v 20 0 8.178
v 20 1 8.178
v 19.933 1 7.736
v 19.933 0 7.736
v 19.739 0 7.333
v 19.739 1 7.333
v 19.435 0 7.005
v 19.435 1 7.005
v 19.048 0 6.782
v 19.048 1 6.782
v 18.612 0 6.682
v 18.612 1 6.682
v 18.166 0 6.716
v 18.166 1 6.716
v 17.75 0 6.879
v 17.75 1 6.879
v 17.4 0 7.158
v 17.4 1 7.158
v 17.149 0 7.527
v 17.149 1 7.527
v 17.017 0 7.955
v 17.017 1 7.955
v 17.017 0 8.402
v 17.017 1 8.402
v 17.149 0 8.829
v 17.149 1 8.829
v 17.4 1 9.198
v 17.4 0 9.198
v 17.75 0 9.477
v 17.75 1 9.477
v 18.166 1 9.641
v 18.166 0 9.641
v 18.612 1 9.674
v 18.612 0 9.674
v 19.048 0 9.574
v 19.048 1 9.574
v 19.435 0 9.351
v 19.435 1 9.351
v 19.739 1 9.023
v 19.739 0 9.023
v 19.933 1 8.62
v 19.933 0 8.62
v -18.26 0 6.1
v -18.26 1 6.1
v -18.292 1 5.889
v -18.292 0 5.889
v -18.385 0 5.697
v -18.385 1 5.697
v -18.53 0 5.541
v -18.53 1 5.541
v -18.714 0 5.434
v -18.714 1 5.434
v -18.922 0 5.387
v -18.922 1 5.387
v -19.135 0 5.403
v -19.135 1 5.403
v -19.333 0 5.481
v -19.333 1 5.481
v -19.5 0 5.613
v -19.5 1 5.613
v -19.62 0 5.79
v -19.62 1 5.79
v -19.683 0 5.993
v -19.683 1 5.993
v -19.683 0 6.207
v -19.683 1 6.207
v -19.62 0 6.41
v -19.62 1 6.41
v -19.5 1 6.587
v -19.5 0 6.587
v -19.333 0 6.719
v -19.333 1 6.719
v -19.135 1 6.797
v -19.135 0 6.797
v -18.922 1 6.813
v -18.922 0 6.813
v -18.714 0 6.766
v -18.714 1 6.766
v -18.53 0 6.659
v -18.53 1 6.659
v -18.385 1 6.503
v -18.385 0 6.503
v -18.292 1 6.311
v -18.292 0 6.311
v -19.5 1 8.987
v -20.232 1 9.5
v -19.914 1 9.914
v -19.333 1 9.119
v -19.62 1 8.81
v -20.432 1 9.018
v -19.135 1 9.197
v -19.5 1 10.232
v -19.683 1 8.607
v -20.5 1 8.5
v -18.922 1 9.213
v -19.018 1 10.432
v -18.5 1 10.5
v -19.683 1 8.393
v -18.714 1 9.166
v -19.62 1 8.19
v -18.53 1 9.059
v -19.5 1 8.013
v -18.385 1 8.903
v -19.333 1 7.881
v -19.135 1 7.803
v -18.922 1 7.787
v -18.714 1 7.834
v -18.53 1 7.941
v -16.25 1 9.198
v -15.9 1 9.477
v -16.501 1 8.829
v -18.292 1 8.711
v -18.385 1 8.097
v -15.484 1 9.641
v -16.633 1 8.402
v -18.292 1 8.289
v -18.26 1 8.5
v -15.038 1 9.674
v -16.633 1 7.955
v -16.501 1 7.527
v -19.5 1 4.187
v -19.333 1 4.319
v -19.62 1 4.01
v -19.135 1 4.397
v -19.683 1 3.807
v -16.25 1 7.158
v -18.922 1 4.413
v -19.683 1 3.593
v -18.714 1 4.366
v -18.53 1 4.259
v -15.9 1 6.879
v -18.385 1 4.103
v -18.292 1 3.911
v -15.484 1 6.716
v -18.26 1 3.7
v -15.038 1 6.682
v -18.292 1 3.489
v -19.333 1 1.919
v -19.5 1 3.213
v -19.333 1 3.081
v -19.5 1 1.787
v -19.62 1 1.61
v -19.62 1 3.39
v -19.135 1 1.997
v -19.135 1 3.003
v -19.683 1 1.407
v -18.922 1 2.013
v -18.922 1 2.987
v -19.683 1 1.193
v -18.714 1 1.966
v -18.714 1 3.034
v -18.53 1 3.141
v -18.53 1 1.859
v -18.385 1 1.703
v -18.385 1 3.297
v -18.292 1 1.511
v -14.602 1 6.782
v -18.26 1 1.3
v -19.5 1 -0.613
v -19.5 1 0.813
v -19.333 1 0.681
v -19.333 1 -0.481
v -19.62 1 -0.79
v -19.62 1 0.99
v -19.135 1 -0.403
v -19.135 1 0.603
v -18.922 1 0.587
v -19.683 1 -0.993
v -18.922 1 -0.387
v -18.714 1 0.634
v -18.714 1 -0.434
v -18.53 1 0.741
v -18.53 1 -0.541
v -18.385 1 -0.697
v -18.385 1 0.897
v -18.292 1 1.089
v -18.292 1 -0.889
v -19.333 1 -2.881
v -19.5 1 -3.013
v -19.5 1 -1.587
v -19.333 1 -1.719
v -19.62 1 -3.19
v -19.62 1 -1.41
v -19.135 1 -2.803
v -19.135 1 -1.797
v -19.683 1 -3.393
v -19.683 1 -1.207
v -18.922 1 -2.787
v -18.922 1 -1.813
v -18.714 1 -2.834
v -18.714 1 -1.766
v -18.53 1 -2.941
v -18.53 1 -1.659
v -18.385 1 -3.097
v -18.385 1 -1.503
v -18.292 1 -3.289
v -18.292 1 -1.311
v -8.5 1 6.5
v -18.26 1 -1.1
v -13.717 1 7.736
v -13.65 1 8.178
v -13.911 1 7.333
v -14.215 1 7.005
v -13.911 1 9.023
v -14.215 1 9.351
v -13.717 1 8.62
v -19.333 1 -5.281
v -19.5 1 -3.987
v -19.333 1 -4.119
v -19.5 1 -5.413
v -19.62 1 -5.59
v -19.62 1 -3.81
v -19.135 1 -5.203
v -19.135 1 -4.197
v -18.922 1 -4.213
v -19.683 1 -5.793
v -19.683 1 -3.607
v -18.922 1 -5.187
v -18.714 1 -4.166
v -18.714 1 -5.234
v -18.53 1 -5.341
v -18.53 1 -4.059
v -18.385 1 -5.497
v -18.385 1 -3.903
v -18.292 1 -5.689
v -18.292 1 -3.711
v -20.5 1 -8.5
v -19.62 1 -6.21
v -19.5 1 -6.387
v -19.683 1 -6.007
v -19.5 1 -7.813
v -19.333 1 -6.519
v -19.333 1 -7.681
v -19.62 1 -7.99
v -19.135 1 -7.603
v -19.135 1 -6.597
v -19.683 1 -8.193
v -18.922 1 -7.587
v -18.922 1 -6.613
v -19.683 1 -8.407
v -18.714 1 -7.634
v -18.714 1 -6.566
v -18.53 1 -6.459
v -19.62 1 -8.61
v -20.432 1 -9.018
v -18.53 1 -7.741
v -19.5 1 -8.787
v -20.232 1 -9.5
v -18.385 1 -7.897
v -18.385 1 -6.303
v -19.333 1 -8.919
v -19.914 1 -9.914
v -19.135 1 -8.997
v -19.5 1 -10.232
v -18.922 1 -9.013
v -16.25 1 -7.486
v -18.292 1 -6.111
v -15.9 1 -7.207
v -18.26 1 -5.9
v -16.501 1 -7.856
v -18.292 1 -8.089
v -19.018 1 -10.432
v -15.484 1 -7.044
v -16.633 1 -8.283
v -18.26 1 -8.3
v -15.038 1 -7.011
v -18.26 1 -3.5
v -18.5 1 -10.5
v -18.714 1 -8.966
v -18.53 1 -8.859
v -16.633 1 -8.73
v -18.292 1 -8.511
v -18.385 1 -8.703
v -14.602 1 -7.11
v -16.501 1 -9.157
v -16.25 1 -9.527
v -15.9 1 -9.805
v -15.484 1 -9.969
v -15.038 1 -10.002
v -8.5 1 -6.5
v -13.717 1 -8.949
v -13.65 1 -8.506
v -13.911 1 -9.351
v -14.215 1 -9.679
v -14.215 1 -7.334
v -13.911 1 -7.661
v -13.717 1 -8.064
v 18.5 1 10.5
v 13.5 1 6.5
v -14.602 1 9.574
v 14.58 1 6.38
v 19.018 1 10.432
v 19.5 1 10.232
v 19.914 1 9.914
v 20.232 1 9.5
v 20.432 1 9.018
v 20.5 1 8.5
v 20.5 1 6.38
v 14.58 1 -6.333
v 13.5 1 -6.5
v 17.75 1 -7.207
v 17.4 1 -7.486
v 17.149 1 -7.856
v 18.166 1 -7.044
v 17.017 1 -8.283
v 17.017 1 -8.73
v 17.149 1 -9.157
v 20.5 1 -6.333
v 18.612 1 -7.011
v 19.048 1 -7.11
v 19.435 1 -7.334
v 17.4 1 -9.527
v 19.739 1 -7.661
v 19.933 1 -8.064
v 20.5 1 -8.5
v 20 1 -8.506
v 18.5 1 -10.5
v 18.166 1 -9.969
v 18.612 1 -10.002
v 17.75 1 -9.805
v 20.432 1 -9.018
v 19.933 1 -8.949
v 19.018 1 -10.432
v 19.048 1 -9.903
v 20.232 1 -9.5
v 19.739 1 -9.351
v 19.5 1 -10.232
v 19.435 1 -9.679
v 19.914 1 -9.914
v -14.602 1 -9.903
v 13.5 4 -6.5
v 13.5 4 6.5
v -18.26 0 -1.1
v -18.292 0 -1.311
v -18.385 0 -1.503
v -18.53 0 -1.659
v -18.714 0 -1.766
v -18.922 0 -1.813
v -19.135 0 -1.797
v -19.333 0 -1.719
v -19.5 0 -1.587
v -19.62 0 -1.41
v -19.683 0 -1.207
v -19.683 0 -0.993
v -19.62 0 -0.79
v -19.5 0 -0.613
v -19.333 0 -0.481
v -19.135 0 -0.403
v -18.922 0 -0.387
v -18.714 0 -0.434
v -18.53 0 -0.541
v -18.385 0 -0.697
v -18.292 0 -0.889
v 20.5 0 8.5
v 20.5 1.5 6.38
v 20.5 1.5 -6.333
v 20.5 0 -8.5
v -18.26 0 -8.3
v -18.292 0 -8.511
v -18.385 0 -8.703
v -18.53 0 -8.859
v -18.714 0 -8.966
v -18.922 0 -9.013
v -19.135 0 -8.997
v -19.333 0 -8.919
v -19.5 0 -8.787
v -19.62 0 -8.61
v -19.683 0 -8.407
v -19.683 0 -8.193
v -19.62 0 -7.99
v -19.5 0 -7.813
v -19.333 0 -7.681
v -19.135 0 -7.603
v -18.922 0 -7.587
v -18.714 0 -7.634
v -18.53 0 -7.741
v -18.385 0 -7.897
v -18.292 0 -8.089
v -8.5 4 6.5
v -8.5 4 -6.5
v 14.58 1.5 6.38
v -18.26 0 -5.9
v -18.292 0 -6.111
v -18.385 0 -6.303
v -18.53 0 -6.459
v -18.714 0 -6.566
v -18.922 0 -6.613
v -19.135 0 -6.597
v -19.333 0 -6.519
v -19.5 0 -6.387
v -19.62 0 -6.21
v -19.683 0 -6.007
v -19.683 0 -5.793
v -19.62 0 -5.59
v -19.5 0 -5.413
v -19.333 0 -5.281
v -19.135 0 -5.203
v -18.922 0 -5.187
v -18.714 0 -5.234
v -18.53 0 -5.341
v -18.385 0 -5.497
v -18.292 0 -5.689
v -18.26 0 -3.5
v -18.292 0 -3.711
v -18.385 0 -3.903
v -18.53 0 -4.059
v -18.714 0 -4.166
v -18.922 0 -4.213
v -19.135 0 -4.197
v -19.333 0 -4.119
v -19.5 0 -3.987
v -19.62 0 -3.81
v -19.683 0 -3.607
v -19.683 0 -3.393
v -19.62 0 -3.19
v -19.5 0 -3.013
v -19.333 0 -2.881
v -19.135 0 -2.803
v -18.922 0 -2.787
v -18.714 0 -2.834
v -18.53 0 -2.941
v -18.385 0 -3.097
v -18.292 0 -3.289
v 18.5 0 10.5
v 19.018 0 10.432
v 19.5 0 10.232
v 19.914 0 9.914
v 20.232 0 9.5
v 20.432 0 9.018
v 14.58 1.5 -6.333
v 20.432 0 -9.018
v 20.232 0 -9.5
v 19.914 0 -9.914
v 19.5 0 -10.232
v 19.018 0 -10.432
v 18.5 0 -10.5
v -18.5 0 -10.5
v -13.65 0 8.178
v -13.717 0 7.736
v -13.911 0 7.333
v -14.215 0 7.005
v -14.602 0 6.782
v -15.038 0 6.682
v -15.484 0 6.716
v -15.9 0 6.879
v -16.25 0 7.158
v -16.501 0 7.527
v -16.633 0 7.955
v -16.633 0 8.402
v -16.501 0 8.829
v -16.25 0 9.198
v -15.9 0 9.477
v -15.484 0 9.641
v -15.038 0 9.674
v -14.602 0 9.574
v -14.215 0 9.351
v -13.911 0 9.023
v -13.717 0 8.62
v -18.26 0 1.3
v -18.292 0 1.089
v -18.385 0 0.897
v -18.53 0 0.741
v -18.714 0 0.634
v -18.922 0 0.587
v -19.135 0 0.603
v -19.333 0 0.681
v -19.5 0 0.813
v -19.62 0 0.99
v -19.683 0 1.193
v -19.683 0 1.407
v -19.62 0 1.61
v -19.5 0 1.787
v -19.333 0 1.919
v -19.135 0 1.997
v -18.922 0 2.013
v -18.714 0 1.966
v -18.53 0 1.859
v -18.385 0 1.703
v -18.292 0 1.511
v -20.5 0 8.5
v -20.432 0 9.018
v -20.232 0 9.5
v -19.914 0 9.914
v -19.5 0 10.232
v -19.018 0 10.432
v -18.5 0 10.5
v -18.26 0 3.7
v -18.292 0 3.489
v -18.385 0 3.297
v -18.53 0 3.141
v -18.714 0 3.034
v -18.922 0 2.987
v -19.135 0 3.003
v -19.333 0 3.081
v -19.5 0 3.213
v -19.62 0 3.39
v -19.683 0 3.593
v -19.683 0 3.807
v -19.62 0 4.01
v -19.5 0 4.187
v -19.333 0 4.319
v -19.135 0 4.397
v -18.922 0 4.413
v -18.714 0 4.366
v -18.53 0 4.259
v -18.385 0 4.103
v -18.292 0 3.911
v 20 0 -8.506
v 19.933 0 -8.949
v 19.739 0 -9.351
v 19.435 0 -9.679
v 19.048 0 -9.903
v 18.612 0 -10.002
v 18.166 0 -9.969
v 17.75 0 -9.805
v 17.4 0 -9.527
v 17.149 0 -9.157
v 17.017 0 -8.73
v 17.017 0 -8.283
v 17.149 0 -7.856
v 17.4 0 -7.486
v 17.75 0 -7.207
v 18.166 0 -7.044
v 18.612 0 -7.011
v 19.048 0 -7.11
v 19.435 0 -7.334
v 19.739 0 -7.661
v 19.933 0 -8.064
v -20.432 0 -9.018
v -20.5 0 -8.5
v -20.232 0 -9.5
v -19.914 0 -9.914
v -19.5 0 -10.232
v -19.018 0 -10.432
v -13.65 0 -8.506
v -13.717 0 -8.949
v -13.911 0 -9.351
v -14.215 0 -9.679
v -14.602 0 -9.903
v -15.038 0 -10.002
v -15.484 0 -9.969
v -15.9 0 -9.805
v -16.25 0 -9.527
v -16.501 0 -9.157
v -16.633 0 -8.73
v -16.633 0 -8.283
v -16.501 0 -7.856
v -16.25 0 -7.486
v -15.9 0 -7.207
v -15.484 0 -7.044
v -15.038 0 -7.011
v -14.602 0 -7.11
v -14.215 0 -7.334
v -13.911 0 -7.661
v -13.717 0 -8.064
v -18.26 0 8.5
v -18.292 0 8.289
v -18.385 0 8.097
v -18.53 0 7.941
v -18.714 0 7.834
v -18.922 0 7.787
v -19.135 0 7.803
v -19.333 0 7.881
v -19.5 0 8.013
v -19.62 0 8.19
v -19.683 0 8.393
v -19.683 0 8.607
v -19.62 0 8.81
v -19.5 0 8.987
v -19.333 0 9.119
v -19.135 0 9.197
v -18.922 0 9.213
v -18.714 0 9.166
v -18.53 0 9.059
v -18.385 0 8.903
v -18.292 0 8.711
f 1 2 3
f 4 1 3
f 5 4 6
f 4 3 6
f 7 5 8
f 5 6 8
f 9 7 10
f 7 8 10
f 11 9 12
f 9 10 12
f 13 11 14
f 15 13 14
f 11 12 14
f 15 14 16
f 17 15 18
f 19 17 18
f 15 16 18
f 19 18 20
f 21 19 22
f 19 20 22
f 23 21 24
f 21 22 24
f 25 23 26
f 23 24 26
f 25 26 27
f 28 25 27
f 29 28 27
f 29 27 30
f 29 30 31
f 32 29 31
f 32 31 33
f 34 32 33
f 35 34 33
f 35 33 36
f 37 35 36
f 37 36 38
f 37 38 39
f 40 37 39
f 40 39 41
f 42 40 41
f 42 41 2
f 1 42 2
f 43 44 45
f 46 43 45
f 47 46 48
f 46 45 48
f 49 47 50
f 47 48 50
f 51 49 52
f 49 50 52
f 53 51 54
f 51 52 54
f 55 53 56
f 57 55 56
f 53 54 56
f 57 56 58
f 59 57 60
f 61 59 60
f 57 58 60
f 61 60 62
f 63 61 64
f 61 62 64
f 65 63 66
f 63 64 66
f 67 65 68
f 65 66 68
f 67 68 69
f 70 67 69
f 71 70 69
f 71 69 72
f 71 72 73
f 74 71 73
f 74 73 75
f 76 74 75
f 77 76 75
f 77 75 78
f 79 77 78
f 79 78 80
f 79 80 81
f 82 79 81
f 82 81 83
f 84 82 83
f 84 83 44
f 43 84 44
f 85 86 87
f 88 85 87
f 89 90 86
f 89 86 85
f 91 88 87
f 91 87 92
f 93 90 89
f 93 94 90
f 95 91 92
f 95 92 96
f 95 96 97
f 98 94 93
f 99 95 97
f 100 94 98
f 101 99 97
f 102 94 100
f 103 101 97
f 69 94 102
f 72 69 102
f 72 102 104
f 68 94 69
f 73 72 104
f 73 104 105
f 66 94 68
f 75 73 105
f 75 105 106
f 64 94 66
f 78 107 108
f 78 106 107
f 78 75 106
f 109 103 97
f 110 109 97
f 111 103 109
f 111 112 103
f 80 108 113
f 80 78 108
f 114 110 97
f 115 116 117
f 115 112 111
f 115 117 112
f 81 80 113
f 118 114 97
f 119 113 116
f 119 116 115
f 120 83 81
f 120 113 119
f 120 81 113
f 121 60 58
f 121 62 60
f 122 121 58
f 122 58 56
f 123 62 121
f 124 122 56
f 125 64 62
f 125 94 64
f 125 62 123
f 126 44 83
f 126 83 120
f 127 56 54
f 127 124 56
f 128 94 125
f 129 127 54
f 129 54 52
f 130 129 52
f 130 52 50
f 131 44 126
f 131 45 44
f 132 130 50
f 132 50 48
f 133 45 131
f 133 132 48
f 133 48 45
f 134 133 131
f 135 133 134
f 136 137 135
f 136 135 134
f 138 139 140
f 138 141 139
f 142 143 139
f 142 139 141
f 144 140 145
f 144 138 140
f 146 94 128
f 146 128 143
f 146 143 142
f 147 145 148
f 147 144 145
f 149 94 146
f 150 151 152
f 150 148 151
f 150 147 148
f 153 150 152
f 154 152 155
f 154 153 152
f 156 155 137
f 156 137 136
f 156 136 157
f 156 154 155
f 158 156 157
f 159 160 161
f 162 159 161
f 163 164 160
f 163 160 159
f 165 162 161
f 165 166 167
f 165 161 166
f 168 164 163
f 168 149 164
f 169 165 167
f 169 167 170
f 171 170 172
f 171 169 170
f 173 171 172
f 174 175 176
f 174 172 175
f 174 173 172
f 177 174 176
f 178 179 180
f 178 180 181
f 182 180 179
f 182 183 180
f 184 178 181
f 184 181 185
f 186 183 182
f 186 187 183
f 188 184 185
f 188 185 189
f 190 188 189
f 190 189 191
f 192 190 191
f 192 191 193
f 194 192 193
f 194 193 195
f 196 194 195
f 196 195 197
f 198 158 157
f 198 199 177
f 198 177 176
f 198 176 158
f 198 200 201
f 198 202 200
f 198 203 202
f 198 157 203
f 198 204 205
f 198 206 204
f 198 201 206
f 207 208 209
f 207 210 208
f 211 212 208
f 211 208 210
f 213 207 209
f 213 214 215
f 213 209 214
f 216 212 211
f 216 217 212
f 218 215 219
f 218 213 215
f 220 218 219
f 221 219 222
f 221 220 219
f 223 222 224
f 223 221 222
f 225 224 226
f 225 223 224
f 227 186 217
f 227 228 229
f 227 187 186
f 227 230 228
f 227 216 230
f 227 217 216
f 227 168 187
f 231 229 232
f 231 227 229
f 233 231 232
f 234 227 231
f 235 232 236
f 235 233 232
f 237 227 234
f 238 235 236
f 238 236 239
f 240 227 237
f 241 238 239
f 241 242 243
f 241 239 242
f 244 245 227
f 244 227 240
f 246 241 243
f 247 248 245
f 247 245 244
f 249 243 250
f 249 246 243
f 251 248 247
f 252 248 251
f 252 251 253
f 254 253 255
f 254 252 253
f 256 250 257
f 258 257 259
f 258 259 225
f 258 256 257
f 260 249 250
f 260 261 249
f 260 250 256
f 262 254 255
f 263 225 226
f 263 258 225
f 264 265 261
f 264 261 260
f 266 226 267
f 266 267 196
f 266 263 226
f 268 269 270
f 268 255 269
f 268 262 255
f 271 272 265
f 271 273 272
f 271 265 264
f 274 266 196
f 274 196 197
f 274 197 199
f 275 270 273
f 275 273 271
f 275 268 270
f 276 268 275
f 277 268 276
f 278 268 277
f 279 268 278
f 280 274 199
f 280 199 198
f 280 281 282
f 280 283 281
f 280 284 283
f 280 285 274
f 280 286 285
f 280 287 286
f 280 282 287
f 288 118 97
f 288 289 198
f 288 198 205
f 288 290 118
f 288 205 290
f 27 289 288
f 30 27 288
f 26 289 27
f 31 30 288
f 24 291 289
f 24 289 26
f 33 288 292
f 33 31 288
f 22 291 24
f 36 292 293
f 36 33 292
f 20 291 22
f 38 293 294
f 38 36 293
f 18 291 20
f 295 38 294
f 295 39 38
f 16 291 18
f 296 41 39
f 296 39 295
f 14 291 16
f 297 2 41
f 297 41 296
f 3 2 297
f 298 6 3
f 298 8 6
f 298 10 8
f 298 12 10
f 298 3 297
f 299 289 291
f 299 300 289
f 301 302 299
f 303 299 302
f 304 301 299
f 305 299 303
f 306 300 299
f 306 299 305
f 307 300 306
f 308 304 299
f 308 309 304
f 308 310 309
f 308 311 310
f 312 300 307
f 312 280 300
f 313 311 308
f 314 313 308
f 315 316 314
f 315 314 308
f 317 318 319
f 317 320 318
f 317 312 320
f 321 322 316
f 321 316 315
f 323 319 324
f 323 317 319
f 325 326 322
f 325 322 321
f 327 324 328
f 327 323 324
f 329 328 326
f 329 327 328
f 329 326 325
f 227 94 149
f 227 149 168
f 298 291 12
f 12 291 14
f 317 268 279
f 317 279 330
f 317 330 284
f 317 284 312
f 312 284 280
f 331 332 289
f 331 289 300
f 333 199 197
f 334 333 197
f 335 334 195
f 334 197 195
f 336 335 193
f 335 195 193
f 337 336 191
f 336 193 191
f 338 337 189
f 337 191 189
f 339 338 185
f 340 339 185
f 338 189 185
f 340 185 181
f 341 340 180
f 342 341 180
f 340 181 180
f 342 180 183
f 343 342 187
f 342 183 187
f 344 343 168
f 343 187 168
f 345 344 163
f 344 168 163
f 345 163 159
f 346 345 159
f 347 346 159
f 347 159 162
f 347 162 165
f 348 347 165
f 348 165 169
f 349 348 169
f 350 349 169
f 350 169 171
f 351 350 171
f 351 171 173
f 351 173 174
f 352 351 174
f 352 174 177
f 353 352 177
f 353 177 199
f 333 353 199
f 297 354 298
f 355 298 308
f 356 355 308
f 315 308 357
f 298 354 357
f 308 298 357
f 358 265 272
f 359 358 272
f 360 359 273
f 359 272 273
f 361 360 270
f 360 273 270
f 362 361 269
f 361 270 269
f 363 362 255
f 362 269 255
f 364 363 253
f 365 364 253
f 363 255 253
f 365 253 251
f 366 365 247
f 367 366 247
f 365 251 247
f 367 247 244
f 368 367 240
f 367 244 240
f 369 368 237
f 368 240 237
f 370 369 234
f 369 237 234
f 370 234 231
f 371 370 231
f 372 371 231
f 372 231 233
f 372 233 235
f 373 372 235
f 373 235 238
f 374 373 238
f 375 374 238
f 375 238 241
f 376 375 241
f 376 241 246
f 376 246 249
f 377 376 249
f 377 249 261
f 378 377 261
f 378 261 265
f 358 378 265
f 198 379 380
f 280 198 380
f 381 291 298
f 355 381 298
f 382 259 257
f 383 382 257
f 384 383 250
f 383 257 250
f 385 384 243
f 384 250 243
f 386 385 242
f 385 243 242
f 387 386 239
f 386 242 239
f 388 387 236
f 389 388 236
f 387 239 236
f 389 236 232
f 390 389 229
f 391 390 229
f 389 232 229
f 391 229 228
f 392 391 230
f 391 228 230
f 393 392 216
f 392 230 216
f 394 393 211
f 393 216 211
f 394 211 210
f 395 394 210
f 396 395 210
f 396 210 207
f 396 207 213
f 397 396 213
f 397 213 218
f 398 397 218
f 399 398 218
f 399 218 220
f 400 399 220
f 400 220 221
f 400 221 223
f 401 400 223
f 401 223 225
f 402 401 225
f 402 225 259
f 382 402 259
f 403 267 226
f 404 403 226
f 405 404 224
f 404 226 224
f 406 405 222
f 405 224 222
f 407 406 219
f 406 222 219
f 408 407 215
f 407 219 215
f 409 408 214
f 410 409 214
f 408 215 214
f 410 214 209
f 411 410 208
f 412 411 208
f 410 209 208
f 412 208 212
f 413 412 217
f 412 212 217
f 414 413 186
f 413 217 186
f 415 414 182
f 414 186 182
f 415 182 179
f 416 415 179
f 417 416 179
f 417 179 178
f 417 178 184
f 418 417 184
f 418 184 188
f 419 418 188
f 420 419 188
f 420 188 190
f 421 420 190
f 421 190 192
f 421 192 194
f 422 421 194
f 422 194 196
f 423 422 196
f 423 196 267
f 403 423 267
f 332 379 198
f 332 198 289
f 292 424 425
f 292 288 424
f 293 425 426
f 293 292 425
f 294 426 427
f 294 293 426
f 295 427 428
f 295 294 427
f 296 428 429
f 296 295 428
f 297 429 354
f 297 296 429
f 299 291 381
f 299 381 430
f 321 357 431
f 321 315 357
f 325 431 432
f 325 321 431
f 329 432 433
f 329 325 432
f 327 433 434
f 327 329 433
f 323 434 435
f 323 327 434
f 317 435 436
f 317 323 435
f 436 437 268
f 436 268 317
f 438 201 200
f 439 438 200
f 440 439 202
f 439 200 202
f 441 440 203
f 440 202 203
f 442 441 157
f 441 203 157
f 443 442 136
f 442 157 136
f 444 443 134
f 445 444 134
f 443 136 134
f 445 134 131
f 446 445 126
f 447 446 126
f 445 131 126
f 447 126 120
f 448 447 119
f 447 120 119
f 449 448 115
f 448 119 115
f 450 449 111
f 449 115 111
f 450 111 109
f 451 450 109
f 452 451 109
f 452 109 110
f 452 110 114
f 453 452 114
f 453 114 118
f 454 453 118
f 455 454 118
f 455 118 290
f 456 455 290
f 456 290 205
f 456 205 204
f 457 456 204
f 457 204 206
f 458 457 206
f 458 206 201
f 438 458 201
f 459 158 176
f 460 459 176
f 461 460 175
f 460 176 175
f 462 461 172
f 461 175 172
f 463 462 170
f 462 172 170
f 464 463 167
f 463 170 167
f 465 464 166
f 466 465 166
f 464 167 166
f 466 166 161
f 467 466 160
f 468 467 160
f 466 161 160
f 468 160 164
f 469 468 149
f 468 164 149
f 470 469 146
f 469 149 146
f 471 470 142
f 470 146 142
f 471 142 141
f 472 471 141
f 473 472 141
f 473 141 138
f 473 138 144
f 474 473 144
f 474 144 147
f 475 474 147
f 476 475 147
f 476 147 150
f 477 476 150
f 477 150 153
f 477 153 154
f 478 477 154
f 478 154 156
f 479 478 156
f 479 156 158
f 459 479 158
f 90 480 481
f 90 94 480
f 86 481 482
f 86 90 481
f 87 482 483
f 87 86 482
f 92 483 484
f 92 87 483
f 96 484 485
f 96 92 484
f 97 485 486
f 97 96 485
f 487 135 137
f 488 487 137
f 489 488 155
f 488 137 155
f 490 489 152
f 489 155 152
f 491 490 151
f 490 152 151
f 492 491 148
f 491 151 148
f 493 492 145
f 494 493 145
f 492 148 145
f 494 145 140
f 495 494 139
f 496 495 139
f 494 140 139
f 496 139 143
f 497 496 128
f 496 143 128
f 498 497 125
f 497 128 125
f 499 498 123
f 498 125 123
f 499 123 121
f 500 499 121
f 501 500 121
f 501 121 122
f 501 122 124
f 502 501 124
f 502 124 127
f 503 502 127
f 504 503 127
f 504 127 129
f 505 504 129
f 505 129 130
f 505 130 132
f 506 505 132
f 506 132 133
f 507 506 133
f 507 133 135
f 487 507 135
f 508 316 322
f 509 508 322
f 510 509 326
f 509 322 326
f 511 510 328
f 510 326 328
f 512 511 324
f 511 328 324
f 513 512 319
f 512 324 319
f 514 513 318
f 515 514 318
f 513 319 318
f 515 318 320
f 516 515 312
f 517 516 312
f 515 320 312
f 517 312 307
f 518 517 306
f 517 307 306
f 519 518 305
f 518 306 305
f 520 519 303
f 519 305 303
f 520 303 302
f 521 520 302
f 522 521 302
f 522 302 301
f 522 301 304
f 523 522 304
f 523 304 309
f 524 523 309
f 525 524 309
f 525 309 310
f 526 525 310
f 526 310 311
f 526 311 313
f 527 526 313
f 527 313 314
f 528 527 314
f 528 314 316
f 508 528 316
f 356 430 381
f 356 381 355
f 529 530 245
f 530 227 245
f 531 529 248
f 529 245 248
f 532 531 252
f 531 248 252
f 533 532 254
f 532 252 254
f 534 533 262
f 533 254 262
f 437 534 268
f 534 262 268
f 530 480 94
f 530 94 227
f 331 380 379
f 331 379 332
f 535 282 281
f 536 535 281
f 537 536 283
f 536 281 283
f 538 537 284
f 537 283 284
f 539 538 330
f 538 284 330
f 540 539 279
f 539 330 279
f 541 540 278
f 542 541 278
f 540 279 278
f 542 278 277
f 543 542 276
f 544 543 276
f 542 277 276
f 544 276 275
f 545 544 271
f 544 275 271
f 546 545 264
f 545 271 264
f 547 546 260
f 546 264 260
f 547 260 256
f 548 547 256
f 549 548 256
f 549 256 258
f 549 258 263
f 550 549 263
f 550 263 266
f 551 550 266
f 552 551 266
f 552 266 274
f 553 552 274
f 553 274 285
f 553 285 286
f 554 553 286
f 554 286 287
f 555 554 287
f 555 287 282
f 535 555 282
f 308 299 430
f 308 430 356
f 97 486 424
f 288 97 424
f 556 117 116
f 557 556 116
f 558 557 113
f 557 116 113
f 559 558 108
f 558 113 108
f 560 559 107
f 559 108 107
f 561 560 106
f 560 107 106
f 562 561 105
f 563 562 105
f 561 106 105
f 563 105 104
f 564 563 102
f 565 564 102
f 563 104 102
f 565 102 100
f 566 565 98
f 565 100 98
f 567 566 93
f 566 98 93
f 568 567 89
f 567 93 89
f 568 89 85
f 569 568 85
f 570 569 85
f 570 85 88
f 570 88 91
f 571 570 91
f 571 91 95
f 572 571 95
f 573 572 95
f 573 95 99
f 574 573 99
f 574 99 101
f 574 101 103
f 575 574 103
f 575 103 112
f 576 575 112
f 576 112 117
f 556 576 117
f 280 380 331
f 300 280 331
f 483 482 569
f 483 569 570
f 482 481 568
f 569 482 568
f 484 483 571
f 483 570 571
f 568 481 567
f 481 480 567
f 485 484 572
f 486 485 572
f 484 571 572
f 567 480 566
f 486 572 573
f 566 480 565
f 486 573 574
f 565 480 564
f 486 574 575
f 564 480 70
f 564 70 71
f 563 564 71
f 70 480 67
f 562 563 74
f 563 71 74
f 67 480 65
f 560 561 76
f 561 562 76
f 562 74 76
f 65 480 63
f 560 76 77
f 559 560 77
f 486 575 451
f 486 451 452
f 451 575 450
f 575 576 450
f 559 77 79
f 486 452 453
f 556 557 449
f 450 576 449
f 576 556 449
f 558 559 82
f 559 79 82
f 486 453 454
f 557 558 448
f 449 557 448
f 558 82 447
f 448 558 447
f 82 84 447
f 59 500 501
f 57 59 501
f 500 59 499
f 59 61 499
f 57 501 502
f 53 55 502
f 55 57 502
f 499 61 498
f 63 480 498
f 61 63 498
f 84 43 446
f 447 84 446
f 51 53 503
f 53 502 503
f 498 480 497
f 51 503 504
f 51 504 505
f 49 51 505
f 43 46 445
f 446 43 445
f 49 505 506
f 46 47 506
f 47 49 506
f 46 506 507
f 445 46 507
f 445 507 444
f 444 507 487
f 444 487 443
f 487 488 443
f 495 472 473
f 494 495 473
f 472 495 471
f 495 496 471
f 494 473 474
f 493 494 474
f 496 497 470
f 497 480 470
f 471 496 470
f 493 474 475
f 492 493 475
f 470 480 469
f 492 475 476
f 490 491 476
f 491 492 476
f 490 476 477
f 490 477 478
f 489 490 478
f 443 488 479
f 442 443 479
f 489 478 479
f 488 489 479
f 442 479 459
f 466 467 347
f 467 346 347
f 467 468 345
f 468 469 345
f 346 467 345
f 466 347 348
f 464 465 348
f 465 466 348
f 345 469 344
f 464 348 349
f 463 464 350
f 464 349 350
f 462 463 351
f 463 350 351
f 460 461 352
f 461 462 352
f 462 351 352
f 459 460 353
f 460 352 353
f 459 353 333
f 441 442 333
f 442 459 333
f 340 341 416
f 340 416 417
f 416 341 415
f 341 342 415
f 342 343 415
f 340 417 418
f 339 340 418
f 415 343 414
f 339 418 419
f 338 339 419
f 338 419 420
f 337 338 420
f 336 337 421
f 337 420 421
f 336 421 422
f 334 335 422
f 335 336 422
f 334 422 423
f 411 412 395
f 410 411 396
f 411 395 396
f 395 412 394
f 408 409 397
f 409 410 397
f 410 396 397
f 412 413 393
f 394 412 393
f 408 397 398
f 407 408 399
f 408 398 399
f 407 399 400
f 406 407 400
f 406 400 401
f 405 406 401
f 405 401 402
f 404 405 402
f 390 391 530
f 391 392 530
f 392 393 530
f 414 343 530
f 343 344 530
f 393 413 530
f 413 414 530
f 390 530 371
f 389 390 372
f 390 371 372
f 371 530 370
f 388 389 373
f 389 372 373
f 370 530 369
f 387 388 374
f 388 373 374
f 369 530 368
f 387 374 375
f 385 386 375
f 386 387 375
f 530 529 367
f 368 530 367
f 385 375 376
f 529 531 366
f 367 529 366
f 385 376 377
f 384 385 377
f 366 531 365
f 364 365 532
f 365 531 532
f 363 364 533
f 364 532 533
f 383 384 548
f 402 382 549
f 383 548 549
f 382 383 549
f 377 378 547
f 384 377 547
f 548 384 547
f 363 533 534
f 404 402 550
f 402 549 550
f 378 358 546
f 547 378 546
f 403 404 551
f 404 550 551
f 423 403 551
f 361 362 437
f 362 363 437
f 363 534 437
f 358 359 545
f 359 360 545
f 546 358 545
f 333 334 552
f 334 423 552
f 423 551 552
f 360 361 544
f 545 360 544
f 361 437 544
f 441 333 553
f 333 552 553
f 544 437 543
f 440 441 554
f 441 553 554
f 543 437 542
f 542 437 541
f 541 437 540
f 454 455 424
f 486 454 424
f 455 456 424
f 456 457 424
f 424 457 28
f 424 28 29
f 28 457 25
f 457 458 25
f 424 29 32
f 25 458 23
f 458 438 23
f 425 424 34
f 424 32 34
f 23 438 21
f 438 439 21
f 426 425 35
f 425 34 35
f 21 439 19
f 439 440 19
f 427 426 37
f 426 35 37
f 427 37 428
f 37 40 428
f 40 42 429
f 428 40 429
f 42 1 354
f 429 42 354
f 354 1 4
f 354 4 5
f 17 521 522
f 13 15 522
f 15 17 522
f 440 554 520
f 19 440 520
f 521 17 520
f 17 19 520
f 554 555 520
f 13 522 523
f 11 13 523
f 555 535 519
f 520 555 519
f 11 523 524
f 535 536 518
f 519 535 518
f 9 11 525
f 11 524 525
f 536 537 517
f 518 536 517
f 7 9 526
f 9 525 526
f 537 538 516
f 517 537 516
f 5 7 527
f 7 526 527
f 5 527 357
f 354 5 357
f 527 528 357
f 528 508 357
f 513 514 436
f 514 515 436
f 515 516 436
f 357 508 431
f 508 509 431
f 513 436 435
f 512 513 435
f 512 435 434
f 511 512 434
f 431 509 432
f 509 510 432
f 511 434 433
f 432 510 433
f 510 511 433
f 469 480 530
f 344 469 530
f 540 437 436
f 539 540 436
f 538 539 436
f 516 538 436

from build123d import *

# Parameters (mm, degrees)
CROQUIS1_W              = 41
CROQUIS1_H              = 21
SALIENTE_EXTRUIR1_DEPTH = 4
CROQUIS2_W              = 12
CROQUIS2_H              = 21.062925544
CORTAR_EXTRUIR1_DEPTH   = 3
CROQUIS3_W              = 7
CROQUIS3_H              = 21
CORTAR_EXTRUIR2_DEPTH   = 3
CROQUIS4_OUTSIDE_W      = 52.248
CROQUIS4_OUTSIDE_H      = 32.248
CROQUIS4_OUTSIDE_W_2    = 22
CROQUIS4_OUTSIDE_H_2    = 13
CORTAR_EXTRUIR3_DEPTH   = 3
REDONDEO1_R             = 2
CROQUIS5_R              = 0.71529937
CORTAR_EXTRUIR5_DEPTH   = 3
MATRIZL2_COUNT          = 8
MATRIZL2_PITCH          = 2.4
CROQUIS6_R              = 1.5
CORTAR_EXTRUIR6_DEPTH   = 3
CROQUIS7_W              = 5.91959288
CROQUIS7_H              = 12.713547862
SALIENTE_EXTRUIR2_DEPTH = 0.5


with BuildPart() as part:
    # Croquis1 → Saliente-Extruir1 (new body)
    with BuildSketch(Plane(origin=(0, 0, 0), x_dir=(1, 0, 0), z_dir=(0, 1, 0))):
        Rectangle(CROQUIS1_W, CROQUIS1_H)
    extrude(amount=SALIENTE_EXTRUIR1_DEPTH)

    # Croquis2 → Cortar-Extruir1 (cut)
    with BuildSketch(Plane(origin=(0, 4, 0), x_dir=(1, 0, 0), z_dir=(0, 1, 0))):
        with Locations((-14.5, -0.031462772)):
            Rectangle(CROQUIS2_W, CROQUIS2_H)
    extrude(amount=-CORTAR_EXTRUIR1_DEPTH, mode=Mode.SUBTRACT)

    # Croquis3 → Cortar-Extruir2 (cut)
    with BuildSketch(Plane(origin=(0, 4, 0), x_dir=(1, 0, 0), z_dir=(0, 1, 0))):
        with Locations((17, 0)):
            Rectangle(CROQUIS3_W, CROQUIS3_H)
    extrude(amount=-CORTAR_EXTRUIR2_DEPTH, mode=Mode.SUBTRACT)

    # Croquis4 outside → Cortar-Extruir3 (cut)
    with BuildSketch(Plane(origin=(0, 4, 0), x_dir=(1, 0, 0), z_dir=(0, 1, 0))):
        Rectangle(CROQUIS4_OUTSIDE_W, CROQUIS4_OUTSIDE_H)
        with Locations((2.5, 0)):
            Rectangle(CROQUIS4_OUTSIDE_W_2, CROQUIS4_OUTSIDE_H_2, mode=Mode.SUBTRACT)
    extrude(amount=-CORTAR_EXTRUIR3_DEPTH, mode=Mode.SUBTRACT)

    # Redondeo1
    redondeo1_edges = [part.edges().sort_by_distance(p)[0] for p in [
        (-20.5, 0.5, 10.5),
        (-20.5, 0.5, -10.5),
        (20.5, 0.5, 10.5),
        (20.5, 0.5, -10.5),
    ]]
    fillet(redondeo1_edges, radius=REDONDEO1_R)

    # Croquis5 → Cortar-Extruir5 (cut)
    with BuildSketch(Plane(origin=(0, 1, 0), x_dir=(1, 0, 0), z_dir=(0, 1, 0))):
        with Locations((-18.975797273, -8.5)):
            Circle(CROQUIS5_R)
    cortar_extruir5 = extrude(amount=-CORTAR_EXTRUIR5_DEPTH, mode=Mode.SUBTRACT)

    # MatrizL2: Cortar-Extruir5 ×8
    with Locations(*[(0, 0, -i * MATRIZL2_PITCH) for i in range(1, MATRIZL2_COUNT)]):
        add(cortar_extruir5, mode=Mode.SUBTRACT)

    # Croquis6 → Cortar-Extruir6 (cut)
    with BuildSketch(Plane(origin=(0, 1, 0), x_dir=(1, 0, 0), z_dir=(0, 1, 0))):
        with Locations((-15.149962862, 8.506455595)):
            Circle(CROQUIS6_R)
        with Locations((18.5, 8.506455595)):
            Circle(CROQUIS6_R)
        with Locations((-15.149962862, -8.178172234)):
            Circle(CROQUIS6_R)
        with Locations((18.5, -8.178172234)):
            Circle(CROQUIS6_R)
    extrude(amount=-CORTAR_EXTRUIR6_DEPTH, mode=Mode.SUBTRACT)

    # Croquis7 → Saliente-Extruir2 (add)
    with BuildSketch(Plane(origin=(0, 1, 0), x_dir=(1, 0, 0), z_dir=(0, 1, 0))):
        with Locations((17.54020356, -0.02363113)):
            Rectangle(CROQUIS7_W, CROQUIS7_H)
    extrude(amount=SALIENTE_EXTRUIR2_DEPTH)


solid = part.part
